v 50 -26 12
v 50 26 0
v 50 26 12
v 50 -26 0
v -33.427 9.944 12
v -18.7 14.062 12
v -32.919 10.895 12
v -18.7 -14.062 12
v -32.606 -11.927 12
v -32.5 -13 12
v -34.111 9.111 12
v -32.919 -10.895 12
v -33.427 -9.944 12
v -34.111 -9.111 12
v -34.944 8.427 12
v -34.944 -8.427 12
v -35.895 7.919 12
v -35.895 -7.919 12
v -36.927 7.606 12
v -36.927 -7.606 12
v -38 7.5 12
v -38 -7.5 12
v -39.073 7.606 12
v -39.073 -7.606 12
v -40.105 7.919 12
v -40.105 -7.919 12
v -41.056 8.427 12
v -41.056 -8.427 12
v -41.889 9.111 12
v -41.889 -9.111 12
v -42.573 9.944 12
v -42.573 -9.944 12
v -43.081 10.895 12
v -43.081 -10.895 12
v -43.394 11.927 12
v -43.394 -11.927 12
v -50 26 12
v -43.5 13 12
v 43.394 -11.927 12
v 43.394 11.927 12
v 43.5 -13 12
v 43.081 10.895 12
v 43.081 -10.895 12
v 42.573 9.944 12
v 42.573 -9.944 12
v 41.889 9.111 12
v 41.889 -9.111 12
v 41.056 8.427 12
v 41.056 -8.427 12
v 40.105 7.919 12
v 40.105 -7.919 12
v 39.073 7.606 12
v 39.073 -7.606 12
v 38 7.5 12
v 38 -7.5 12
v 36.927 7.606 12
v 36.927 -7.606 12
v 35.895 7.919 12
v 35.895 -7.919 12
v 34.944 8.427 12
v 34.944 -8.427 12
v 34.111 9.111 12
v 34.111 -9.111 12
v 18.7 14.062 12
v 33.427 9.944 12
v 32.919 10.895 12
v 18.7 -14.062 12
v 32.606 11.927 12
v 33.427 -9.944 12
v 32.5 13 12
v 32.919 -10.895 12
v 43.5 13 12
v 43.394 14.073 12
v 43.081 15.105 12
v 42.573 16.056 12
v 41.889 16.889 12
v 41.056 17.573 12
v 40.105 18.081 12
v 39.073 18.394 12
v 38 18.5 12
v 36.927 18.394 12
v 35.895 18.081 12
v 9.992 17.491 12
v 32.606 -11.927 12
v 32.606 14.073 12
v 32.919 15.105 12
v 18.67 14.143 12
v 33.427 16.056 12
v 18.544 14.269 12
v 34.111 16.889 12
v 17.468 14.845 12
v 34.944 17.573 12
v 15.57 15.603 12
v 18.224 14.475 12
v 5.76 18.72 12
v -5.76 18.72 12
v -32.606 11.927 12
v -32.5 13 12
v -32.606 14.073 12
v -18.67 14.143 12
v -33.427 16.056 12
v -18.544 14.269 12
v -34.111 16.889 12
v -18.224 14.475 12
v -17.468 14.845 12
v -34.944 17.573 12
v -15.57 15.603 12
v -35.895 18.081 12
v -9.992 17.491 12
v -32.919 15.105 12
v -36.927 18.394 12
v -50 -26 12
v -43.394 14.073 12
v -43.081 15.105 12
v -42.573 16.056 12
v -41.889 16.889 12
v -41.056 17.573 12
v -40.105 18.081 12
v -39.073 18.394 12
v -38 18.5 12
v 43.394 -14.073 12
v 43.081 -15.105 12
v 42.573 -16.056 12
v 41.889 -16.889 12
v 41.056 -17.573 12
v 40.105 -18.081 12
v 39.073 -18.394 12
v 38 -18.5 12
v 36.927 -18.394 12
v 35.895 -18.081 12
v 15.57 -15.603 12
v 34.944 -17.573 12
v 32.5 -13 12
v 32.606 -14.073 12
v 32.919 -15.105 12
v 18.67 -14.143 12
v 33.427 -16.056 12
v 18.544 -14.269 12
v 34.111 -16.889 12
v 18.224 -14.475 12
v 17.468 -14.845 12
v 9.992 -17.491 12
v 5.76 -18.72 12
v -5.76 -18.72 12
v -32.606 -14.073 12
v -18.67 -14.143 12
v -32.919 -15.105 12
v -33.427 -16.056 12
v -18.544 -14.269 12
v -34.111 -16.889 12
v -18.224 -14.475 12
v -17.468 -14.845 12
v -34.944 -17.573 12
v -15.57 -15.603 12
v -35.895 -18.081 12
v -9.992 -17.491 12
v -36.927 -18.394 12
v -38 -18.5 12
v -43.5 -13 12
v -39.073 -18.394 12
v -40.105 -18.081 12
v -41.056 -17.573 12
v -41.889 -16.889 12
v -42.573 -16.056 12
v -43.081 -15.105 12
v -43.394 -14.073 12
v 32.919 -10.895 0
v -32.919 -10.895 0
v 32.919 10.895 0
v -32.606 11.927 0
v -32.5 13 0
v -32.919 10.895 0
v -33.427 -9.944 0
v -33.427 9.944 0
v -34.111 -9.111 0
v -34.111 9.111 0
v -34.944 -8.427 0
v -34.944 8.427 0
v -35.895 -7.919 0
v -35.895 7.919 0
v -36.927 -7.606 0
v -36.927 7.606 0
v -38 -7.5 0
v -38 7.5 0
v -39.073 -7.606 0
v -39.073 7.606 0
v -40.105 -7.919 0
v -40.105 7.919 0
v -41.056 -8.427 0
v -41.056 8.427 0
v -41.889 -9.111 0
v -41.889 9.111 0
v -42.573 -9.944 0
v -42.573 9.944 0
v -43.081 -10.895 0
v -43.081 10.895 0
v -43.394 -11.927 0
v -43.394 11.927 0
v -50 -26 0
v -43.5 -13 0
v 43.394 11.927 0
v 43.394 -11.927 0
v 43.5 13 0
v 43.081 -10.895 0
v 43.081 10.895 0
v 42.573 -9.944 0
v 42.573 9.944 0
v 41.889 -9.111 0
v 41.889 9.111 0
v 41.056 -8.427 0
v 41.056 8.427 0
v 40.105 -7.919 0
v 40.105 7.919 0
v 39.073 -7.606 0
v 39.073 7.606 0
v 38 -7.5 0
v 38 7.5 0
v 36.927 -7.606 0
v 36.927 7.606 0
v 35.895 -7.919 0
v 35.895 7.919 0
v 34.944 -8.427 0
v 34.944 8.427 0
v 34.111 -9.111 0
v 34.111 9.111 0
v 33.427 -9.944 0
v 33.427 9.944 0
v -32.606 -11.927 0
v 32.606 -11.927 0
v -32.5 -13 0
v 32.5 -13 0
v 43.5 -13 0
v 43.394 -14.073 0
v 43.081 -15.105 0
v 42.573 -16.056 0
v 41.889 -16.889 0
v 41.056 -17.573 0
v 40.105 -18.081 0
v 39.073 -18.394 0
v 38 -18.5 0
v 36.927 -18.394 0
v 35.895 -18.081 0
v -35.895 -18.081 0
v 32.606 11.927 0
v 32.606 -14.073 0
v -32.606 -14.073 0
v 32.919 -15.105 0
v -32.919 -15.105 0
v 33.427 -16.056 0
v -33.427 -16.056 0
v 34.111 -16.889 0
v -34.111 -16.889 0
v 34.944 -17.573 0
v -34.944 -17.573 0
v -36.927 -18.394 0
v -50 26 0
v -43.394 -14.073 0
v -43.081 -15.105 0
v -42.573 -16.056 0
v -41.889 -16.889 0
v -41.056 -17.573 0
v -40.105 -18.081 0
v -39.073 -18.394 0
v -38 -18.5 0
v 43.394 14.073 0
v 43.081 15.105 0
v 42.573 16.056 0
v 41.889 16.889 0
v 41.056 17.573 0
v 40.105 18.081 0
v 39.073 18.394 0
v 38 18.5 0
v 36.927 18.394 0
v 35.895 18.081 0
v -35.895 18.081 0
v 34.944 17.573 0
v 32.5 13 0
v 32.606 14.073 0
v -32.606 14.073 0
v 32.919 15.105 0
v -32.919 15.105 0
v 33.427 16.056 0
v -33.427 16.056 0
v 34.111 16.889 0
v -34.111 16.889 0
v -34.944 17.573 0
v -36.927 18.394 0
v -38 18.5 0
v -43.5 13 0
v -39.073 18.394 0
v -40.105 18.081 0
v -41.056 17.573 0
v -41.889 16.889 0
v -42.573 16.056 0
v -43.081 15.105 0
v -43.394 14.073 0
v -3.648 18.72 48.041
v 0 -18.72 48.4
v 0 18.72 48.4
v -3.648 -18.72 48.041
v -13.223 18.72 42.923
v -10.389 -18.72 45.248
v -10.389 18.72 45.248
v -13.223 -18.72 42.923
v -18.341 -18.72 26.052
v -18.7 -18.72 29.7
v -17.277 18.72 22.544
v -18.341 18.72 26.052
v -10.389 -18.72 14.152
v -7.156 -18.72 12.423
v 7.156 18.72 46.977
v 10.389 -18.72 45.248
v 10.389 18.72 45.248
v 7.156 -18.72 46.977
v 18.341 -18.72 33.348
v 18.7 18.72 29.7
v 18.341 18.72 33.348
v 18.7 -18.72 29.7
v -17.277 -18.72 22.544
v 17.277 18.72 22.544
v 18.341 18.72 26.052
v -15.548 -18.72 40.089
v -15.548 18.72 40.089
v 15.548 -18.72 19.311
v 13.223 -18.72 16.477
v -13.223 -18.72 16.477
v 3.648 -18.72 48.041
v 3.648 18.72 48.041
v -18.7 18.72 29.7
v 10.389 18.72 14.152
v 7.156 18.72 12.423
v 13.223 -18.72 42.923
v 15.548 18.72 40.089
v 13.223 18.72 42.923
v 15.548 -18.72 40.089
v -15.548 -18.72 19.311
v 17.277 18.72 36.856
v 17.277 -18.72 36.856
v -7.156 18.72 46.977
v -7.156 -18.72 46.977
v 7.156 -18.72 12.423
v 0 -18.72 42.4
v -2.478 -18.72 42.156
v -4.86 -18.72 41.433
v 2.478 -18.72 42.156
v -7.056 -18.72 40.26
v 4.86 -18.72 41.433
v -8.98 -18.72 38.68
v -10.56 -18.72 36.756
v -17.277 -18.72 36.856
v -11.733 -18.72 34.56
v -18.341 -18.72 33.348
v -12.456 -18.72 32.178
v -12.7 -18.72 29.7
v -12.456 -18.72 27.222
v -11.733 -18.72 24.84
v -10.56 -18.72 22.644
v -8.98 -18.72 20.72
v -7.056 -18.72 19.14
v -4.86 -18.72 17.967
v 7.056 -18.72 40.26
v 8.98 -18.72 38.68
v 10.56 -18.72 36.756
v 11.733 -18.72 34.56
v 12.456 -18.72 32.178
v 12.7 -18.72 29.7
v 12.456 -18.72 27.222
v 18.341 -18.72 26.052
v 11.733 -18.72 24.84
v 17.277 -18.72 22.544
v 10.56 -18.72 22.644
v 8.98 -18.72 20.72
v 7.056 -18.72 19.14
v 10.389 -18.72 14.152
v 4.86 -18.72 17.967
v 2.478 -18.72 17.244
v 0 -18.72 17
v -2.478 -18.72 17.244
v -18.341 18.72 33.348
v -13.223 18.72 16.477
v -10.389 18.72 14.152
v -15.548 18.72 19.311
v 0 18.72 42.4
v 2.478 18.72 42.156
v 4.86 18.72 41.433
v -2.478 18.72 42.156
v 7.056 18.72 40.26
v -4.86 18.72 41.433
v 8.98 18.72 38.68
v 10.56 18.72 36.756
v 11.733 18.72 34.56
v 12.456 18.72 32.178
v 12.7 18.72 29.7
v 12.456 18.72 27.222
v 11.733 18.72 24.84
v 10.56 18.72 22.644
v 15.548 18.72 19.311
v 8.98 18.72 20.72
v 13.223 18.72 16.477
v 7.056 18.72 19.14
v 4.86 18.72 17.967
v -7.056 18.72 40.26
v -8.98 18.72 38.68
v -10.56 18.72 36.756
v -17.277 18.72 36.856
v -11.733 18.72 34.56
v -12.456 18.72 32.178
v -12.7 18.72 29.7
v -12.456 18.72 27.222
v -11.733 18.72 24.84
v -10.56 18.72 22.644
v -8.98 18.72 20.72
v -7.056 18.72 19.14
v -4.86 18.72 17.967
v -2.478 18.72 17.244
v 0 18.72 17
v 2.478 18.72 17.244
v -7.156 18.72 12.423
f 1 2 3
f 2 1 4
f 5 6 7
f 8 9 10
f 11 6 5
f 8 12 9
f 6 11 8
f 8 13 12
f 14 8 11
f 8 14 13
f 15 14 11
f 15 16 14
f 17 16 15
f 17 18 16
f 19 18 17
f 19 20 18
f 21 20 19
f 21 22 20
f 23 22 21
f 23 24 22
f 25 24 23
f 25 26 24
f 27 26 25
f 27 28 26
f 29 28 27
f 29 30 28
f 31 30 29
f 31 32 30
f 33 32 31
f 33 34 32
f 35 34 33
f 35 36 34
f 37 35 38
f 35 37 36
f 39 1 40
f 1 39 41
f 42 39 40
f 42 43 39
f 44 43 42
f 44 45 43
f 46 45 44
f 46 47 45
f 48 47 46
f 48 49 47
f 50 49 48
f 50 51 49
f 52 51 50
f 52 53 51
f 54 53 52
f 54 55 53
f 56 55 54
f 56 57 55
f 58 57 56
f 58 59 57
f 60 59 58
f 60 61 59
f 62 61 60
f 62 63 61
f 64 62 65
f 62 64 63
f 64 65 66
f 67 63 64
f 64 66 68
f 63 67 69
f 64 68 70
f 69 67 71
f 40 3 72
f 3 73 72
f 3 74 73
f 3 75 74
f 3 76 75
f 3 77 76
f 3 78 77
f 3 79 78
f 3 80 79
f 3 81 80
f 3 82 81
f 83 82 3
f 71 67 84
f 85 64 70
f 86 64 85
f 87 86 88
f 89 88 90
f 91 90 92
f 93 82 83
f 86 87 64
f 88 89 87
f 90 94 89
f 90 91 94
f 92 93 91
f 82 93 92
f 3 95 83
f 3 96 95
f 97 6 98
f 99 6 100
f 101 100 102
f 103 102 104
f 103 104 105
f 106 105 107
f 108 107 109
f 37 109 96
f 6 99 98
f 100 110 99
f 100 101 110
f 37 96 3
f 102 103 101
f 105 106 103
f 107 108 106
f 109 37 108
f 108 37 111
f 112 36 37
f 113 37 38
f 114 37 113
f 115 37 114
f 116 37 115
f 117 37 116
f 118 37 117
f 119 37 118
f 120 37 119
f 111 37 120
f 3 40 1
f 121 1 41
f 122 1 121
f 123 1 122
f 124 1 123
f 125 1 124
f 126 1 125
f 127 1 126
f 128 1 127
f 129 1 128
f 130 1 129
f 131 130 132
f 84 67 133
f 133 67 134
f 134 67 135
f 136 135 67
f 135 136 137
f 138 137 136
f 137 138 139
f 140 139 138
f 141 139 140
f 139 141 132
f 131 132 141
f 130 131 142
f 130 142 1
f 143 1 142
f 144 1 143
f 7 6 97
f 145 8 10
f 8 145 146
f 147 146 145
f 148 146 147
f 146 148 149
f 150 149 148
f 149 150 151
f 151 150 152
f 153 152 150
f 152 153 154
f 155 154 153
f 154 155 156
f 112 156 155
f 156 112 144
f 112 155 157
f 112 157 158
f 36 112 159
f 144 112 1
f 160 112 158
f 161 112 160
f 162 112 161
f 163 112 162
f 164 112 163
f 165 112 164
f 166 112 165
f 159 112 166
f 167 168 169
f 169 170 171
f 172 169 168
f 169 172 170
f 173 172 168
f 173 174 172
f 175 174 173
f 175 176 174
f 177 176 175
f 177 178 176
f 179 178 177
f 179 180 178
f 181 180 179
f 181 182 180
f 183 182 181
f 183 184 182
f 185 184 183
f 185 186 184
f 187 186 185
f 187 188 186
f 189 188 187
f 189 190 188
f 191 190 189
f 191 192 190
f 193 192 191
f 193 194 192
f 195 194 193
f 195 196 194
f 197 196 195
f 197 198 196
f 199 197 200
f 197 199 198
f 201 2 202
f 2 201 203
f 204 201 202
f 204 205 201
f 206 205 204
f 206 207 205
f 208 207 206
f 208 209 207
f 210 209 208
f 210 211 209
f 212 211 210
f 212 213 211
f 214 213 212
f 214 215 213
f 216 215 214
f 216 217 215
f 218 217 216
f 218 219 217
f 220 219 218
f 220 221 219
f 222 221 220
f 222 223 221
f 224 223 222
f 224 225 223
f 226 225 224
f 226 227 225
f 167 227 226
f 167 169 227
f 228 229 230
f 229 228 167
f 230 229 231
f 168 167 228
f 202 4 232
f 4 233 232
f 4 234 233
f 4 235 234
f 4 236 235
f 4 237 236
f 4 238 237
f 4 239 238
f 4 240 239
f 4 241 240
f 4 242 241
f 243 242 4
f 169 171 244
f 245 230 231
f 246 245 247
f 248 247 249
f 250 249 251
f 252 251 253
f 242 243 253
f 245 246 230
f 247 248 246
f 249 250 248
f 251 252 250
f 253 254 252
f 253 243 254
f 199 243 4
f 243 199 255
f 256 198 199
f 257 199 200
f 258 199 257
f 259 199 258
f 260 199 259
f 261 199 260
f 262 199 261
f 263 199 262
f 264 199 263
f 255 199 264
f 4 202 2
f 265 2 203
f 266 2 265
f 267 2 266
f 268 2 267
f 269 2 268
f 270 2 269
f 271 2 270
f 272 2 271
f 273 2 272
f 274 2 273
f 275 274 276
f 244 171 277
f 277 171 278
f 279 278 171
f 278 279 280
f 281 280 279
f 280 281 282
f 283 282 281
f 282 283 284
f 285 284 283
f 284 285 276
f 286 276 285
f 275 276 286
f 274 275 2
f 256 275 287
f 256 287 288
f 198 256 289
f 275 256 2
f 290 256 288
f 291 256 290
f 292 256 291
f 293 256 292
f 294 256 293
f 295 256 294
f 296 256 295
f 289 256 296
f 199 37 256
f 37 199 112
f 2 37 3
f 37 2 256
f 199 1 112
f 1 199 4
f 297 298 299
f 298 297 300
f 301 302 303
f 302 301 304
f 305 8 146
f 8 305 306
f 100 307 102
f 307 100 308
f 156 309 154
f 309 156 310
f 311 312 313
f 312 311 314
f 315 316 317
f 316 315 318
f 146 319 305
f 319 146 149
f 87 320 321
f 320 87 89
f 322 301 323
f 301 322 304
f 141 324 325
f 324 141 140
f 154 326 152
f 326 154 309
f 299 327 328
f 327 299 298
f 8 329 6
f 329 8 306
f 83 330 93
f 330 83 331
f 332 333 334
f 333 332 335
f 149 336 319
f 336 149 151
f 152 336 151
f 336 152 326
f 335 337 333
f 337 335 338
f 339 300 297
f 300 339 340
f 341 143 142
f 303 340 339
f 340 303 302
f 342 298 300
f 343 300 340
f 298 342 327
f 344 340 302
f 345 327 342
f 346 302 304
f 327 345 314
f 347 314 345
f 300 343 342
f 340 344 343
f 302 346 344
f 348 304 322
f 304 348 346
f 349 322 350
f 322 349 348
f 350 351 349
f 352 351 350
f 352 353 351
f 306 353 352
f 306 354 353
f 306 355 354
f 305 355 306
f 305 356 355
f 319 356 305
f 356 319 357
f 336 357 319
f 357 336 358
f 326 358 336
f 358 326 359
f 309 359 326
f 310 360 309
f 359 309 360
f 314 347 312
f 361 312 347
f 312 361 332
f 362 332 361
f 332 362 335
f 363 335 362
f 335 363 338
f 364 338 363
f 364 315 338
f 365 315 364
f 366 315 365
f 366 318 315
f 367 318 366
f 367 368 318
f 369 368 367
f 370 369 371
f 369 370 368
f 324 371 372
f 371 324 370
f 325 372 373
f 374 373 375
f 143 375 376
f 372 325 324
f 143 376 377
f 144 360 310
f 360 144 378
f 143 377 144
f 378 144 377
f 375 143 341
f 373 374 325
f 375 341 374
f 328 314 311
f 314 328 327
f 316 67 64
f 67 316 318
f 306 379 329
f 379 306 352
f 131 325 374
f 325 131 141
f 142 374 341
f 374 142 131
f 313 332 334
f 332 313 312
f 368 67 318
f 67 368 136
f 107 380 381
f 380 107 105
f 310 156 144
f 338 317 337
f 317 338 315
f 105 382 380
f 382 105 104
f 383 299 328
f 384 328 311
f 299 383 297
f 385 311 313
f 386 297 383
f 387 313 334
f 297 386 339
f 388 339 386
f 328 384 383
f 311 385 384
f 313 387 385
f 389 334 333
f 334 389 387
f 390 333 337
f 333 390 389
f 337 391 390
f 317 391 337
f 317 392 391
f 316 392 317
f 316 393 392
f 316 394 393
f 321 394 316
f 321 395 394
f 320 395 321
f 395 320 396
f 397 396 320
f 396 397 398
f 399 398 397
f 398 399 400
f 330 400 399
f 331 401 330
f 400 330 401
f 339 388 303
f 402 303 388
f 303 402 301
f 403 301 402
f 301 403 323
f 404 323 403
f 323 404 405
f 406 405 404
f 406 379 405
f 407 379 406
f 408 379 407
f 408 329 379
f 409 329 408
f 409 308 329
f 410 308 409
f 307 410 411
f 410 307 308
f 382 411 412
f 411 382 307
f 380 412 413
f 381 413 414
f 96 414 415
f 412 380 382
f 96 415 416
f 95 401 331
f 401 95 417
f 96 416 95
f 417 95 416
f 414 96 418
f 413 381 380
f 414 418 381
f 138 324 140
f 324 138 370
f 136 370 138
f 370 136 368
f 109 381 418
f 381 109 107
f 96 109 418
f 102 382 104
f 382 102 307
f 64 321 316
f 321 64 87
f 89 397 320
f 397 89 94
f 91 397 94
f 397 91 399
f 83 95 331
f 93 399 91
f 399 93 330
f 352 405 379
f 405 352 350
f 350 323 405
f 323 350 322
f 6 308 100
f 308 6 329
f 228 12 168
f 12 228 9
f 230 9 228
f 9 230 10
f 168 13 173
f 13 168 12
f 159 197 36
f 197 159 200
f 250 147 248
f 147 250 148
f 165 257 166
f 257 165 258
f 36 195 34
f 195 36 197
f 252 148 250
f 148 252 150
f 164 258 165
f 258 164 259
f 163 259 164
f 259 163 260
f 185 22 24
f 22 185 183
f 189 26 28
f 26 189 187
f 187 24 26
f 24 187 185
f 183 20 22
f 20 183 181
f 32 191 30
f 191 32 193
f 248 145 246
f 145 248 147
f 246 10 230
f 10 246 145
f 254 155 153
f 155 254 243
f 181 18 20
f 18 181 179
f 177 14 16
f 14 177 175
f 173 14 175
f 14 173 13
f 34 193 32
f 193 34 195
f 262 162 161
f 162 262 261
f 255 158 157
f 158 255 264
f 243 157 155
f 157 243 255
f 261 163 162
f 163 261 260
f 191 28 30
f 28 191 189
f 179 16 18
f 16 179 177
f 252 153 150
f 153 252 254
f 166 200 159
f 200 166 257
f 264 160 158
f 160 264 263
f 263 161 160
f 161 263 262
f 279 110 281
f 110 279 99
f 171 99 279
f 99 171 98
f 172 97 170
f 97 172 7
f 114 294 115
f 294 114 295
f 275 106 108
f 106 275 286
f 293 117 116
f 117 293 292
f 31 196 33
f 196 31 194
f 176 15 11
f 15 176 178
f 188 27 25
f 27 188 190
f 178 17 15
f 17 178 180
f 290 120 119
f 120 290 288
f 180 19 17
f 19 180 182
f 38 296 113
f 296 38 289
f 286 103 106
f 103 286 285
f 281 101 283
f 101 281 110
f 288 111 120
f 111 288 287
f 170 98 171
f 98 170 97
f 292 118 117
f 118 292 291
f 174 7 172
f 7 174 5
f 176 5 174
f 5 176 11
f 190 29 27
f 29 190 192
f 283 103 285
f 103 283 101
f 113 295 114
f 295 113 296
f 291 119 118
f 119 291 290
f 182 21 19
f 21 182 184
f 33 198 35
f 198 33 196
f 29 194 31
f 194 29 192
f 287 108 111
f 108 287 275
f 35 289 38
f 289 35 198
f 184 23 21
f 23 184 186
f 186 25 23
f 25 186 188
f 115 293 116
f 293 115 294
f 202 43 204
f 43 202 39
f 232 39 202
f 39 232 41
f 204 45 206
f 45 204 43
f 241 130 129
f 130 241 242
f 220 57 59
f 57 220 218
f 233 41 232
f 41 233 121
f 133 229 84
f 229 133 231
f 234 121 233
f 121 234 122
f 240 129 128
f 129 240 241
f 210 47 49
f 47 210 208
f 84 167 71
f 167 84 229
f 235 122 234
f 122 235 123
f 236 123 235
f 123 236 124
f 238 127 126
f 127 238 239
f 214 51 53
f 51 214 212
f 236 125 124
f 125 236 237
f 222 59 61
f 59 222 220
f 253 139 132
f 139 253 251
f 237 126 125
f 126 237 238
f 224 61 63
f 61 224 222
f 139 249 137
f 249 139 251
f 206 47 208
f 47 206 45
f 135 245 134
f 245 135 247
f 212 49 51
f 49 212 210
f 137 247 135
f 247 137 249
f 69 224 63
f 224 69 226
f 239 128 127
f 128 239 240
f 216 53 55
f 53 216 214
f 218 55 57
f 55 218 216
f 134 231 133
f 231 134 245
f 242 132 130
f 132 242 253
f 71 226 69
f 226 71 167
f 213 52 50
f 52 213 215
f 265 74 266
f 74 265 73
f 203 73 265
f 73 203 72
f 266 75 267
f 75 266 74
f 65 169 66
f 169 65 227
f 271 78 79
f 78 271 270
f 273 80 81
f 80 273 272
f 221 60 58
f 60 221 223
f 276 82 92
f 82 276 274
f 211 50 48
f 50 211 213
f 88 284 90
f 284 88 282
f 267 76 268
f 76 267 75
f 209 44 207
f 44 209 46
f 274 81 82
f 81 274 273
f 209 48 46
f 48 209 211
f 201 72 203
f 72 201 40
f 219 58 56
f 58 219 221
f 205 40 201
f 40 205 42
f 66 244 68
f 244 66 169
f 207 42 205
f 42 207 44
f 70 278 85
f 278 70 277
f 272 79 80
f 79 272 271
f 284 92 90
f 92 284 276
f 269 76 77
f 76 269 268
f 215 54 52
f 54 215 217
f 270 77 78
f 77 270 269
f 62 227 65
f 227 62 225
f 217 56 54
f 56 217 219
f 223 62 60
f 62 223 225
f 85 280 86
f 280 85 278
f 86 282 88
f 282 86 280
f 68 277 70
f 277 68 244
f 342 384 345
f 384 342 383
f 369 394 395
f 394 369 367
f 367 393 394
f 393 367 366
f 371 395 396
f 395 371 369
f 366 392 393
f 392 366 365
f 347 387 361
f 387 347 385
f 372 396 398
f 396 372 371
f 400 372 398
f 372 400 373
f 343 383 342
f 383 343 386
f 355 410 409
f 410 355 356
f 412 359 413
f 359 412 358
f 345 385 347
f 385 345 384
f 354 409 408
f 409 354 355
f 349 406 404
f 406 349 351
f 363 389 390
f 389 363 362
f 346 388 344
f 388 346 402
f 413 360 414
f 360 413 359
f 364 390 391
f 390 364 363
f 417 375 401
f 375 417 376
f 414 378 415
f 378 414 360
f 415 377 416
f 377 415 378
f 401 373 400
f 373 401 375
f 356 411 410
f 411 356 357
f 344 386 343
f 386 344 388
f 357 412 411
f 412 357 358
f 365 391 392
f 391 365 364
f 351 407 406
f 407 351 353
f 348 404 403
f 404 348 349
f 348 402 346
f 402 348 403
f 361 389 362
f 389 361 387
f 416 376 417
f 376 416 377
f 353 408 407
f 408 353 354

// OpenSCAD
$fn = 32;

// ----------------------------------------------------------------------
// Bearing block: 100 x 52 mm base, 25.4 mm bore at 29.7 mm
// ----------------------------------------------------------------------

// --- parameters (mm) ---
base_w = 100;             // base width
base_d = 52;              // base depth
base_t = 12;              // base thickness
bore_d = 25.4;            // shaft / bearing bore
house_r = 18.7;           // housing outer radius
house_len = 37.44;        // housing length along the shaft
foot_w = 37.4;            // foot width under the housing
foot_len = 27.44;         // foot length along the shaft
axis_z = 29.7;            // bore axis height above the base
holes_d = 11;             // mounting holes
hole_x = 38;              // mounting hole spacing

difference() {
  union() {
    /* base plate with its underside on z = 0 */
    translate([0, 0, base_t / 2]) cube([base_w, base_d, base_t], center = true);
    /* hull foot: a straight web blending into the round housing */
    hull() {
      translate([0, 0, base_t - 0.5]) cube([foot_w, foot_len, 1.6], center = true);
      translate([0, 0, axis_z]) rotate([-90, 0, 0]) cylinder(h = house_len, d = 2 * house_r, center = true);
    }
  }
  /* bore through the housing, 2.5 mm clear on both sides */
  translate([0, 0, axis_z]) rotate([-90, 0, 0]) cylinder(h = house_len + 5, d = bore_d, center = true);
  /* mounting holes through the base plate */
  for (hx = [-38, 38]) {
    for (hy = [-13, 13]) {
      translate([hx, hy, -2.5]) cylinder(h = base_t + 5, d = holes_d);
    }
  }
}
